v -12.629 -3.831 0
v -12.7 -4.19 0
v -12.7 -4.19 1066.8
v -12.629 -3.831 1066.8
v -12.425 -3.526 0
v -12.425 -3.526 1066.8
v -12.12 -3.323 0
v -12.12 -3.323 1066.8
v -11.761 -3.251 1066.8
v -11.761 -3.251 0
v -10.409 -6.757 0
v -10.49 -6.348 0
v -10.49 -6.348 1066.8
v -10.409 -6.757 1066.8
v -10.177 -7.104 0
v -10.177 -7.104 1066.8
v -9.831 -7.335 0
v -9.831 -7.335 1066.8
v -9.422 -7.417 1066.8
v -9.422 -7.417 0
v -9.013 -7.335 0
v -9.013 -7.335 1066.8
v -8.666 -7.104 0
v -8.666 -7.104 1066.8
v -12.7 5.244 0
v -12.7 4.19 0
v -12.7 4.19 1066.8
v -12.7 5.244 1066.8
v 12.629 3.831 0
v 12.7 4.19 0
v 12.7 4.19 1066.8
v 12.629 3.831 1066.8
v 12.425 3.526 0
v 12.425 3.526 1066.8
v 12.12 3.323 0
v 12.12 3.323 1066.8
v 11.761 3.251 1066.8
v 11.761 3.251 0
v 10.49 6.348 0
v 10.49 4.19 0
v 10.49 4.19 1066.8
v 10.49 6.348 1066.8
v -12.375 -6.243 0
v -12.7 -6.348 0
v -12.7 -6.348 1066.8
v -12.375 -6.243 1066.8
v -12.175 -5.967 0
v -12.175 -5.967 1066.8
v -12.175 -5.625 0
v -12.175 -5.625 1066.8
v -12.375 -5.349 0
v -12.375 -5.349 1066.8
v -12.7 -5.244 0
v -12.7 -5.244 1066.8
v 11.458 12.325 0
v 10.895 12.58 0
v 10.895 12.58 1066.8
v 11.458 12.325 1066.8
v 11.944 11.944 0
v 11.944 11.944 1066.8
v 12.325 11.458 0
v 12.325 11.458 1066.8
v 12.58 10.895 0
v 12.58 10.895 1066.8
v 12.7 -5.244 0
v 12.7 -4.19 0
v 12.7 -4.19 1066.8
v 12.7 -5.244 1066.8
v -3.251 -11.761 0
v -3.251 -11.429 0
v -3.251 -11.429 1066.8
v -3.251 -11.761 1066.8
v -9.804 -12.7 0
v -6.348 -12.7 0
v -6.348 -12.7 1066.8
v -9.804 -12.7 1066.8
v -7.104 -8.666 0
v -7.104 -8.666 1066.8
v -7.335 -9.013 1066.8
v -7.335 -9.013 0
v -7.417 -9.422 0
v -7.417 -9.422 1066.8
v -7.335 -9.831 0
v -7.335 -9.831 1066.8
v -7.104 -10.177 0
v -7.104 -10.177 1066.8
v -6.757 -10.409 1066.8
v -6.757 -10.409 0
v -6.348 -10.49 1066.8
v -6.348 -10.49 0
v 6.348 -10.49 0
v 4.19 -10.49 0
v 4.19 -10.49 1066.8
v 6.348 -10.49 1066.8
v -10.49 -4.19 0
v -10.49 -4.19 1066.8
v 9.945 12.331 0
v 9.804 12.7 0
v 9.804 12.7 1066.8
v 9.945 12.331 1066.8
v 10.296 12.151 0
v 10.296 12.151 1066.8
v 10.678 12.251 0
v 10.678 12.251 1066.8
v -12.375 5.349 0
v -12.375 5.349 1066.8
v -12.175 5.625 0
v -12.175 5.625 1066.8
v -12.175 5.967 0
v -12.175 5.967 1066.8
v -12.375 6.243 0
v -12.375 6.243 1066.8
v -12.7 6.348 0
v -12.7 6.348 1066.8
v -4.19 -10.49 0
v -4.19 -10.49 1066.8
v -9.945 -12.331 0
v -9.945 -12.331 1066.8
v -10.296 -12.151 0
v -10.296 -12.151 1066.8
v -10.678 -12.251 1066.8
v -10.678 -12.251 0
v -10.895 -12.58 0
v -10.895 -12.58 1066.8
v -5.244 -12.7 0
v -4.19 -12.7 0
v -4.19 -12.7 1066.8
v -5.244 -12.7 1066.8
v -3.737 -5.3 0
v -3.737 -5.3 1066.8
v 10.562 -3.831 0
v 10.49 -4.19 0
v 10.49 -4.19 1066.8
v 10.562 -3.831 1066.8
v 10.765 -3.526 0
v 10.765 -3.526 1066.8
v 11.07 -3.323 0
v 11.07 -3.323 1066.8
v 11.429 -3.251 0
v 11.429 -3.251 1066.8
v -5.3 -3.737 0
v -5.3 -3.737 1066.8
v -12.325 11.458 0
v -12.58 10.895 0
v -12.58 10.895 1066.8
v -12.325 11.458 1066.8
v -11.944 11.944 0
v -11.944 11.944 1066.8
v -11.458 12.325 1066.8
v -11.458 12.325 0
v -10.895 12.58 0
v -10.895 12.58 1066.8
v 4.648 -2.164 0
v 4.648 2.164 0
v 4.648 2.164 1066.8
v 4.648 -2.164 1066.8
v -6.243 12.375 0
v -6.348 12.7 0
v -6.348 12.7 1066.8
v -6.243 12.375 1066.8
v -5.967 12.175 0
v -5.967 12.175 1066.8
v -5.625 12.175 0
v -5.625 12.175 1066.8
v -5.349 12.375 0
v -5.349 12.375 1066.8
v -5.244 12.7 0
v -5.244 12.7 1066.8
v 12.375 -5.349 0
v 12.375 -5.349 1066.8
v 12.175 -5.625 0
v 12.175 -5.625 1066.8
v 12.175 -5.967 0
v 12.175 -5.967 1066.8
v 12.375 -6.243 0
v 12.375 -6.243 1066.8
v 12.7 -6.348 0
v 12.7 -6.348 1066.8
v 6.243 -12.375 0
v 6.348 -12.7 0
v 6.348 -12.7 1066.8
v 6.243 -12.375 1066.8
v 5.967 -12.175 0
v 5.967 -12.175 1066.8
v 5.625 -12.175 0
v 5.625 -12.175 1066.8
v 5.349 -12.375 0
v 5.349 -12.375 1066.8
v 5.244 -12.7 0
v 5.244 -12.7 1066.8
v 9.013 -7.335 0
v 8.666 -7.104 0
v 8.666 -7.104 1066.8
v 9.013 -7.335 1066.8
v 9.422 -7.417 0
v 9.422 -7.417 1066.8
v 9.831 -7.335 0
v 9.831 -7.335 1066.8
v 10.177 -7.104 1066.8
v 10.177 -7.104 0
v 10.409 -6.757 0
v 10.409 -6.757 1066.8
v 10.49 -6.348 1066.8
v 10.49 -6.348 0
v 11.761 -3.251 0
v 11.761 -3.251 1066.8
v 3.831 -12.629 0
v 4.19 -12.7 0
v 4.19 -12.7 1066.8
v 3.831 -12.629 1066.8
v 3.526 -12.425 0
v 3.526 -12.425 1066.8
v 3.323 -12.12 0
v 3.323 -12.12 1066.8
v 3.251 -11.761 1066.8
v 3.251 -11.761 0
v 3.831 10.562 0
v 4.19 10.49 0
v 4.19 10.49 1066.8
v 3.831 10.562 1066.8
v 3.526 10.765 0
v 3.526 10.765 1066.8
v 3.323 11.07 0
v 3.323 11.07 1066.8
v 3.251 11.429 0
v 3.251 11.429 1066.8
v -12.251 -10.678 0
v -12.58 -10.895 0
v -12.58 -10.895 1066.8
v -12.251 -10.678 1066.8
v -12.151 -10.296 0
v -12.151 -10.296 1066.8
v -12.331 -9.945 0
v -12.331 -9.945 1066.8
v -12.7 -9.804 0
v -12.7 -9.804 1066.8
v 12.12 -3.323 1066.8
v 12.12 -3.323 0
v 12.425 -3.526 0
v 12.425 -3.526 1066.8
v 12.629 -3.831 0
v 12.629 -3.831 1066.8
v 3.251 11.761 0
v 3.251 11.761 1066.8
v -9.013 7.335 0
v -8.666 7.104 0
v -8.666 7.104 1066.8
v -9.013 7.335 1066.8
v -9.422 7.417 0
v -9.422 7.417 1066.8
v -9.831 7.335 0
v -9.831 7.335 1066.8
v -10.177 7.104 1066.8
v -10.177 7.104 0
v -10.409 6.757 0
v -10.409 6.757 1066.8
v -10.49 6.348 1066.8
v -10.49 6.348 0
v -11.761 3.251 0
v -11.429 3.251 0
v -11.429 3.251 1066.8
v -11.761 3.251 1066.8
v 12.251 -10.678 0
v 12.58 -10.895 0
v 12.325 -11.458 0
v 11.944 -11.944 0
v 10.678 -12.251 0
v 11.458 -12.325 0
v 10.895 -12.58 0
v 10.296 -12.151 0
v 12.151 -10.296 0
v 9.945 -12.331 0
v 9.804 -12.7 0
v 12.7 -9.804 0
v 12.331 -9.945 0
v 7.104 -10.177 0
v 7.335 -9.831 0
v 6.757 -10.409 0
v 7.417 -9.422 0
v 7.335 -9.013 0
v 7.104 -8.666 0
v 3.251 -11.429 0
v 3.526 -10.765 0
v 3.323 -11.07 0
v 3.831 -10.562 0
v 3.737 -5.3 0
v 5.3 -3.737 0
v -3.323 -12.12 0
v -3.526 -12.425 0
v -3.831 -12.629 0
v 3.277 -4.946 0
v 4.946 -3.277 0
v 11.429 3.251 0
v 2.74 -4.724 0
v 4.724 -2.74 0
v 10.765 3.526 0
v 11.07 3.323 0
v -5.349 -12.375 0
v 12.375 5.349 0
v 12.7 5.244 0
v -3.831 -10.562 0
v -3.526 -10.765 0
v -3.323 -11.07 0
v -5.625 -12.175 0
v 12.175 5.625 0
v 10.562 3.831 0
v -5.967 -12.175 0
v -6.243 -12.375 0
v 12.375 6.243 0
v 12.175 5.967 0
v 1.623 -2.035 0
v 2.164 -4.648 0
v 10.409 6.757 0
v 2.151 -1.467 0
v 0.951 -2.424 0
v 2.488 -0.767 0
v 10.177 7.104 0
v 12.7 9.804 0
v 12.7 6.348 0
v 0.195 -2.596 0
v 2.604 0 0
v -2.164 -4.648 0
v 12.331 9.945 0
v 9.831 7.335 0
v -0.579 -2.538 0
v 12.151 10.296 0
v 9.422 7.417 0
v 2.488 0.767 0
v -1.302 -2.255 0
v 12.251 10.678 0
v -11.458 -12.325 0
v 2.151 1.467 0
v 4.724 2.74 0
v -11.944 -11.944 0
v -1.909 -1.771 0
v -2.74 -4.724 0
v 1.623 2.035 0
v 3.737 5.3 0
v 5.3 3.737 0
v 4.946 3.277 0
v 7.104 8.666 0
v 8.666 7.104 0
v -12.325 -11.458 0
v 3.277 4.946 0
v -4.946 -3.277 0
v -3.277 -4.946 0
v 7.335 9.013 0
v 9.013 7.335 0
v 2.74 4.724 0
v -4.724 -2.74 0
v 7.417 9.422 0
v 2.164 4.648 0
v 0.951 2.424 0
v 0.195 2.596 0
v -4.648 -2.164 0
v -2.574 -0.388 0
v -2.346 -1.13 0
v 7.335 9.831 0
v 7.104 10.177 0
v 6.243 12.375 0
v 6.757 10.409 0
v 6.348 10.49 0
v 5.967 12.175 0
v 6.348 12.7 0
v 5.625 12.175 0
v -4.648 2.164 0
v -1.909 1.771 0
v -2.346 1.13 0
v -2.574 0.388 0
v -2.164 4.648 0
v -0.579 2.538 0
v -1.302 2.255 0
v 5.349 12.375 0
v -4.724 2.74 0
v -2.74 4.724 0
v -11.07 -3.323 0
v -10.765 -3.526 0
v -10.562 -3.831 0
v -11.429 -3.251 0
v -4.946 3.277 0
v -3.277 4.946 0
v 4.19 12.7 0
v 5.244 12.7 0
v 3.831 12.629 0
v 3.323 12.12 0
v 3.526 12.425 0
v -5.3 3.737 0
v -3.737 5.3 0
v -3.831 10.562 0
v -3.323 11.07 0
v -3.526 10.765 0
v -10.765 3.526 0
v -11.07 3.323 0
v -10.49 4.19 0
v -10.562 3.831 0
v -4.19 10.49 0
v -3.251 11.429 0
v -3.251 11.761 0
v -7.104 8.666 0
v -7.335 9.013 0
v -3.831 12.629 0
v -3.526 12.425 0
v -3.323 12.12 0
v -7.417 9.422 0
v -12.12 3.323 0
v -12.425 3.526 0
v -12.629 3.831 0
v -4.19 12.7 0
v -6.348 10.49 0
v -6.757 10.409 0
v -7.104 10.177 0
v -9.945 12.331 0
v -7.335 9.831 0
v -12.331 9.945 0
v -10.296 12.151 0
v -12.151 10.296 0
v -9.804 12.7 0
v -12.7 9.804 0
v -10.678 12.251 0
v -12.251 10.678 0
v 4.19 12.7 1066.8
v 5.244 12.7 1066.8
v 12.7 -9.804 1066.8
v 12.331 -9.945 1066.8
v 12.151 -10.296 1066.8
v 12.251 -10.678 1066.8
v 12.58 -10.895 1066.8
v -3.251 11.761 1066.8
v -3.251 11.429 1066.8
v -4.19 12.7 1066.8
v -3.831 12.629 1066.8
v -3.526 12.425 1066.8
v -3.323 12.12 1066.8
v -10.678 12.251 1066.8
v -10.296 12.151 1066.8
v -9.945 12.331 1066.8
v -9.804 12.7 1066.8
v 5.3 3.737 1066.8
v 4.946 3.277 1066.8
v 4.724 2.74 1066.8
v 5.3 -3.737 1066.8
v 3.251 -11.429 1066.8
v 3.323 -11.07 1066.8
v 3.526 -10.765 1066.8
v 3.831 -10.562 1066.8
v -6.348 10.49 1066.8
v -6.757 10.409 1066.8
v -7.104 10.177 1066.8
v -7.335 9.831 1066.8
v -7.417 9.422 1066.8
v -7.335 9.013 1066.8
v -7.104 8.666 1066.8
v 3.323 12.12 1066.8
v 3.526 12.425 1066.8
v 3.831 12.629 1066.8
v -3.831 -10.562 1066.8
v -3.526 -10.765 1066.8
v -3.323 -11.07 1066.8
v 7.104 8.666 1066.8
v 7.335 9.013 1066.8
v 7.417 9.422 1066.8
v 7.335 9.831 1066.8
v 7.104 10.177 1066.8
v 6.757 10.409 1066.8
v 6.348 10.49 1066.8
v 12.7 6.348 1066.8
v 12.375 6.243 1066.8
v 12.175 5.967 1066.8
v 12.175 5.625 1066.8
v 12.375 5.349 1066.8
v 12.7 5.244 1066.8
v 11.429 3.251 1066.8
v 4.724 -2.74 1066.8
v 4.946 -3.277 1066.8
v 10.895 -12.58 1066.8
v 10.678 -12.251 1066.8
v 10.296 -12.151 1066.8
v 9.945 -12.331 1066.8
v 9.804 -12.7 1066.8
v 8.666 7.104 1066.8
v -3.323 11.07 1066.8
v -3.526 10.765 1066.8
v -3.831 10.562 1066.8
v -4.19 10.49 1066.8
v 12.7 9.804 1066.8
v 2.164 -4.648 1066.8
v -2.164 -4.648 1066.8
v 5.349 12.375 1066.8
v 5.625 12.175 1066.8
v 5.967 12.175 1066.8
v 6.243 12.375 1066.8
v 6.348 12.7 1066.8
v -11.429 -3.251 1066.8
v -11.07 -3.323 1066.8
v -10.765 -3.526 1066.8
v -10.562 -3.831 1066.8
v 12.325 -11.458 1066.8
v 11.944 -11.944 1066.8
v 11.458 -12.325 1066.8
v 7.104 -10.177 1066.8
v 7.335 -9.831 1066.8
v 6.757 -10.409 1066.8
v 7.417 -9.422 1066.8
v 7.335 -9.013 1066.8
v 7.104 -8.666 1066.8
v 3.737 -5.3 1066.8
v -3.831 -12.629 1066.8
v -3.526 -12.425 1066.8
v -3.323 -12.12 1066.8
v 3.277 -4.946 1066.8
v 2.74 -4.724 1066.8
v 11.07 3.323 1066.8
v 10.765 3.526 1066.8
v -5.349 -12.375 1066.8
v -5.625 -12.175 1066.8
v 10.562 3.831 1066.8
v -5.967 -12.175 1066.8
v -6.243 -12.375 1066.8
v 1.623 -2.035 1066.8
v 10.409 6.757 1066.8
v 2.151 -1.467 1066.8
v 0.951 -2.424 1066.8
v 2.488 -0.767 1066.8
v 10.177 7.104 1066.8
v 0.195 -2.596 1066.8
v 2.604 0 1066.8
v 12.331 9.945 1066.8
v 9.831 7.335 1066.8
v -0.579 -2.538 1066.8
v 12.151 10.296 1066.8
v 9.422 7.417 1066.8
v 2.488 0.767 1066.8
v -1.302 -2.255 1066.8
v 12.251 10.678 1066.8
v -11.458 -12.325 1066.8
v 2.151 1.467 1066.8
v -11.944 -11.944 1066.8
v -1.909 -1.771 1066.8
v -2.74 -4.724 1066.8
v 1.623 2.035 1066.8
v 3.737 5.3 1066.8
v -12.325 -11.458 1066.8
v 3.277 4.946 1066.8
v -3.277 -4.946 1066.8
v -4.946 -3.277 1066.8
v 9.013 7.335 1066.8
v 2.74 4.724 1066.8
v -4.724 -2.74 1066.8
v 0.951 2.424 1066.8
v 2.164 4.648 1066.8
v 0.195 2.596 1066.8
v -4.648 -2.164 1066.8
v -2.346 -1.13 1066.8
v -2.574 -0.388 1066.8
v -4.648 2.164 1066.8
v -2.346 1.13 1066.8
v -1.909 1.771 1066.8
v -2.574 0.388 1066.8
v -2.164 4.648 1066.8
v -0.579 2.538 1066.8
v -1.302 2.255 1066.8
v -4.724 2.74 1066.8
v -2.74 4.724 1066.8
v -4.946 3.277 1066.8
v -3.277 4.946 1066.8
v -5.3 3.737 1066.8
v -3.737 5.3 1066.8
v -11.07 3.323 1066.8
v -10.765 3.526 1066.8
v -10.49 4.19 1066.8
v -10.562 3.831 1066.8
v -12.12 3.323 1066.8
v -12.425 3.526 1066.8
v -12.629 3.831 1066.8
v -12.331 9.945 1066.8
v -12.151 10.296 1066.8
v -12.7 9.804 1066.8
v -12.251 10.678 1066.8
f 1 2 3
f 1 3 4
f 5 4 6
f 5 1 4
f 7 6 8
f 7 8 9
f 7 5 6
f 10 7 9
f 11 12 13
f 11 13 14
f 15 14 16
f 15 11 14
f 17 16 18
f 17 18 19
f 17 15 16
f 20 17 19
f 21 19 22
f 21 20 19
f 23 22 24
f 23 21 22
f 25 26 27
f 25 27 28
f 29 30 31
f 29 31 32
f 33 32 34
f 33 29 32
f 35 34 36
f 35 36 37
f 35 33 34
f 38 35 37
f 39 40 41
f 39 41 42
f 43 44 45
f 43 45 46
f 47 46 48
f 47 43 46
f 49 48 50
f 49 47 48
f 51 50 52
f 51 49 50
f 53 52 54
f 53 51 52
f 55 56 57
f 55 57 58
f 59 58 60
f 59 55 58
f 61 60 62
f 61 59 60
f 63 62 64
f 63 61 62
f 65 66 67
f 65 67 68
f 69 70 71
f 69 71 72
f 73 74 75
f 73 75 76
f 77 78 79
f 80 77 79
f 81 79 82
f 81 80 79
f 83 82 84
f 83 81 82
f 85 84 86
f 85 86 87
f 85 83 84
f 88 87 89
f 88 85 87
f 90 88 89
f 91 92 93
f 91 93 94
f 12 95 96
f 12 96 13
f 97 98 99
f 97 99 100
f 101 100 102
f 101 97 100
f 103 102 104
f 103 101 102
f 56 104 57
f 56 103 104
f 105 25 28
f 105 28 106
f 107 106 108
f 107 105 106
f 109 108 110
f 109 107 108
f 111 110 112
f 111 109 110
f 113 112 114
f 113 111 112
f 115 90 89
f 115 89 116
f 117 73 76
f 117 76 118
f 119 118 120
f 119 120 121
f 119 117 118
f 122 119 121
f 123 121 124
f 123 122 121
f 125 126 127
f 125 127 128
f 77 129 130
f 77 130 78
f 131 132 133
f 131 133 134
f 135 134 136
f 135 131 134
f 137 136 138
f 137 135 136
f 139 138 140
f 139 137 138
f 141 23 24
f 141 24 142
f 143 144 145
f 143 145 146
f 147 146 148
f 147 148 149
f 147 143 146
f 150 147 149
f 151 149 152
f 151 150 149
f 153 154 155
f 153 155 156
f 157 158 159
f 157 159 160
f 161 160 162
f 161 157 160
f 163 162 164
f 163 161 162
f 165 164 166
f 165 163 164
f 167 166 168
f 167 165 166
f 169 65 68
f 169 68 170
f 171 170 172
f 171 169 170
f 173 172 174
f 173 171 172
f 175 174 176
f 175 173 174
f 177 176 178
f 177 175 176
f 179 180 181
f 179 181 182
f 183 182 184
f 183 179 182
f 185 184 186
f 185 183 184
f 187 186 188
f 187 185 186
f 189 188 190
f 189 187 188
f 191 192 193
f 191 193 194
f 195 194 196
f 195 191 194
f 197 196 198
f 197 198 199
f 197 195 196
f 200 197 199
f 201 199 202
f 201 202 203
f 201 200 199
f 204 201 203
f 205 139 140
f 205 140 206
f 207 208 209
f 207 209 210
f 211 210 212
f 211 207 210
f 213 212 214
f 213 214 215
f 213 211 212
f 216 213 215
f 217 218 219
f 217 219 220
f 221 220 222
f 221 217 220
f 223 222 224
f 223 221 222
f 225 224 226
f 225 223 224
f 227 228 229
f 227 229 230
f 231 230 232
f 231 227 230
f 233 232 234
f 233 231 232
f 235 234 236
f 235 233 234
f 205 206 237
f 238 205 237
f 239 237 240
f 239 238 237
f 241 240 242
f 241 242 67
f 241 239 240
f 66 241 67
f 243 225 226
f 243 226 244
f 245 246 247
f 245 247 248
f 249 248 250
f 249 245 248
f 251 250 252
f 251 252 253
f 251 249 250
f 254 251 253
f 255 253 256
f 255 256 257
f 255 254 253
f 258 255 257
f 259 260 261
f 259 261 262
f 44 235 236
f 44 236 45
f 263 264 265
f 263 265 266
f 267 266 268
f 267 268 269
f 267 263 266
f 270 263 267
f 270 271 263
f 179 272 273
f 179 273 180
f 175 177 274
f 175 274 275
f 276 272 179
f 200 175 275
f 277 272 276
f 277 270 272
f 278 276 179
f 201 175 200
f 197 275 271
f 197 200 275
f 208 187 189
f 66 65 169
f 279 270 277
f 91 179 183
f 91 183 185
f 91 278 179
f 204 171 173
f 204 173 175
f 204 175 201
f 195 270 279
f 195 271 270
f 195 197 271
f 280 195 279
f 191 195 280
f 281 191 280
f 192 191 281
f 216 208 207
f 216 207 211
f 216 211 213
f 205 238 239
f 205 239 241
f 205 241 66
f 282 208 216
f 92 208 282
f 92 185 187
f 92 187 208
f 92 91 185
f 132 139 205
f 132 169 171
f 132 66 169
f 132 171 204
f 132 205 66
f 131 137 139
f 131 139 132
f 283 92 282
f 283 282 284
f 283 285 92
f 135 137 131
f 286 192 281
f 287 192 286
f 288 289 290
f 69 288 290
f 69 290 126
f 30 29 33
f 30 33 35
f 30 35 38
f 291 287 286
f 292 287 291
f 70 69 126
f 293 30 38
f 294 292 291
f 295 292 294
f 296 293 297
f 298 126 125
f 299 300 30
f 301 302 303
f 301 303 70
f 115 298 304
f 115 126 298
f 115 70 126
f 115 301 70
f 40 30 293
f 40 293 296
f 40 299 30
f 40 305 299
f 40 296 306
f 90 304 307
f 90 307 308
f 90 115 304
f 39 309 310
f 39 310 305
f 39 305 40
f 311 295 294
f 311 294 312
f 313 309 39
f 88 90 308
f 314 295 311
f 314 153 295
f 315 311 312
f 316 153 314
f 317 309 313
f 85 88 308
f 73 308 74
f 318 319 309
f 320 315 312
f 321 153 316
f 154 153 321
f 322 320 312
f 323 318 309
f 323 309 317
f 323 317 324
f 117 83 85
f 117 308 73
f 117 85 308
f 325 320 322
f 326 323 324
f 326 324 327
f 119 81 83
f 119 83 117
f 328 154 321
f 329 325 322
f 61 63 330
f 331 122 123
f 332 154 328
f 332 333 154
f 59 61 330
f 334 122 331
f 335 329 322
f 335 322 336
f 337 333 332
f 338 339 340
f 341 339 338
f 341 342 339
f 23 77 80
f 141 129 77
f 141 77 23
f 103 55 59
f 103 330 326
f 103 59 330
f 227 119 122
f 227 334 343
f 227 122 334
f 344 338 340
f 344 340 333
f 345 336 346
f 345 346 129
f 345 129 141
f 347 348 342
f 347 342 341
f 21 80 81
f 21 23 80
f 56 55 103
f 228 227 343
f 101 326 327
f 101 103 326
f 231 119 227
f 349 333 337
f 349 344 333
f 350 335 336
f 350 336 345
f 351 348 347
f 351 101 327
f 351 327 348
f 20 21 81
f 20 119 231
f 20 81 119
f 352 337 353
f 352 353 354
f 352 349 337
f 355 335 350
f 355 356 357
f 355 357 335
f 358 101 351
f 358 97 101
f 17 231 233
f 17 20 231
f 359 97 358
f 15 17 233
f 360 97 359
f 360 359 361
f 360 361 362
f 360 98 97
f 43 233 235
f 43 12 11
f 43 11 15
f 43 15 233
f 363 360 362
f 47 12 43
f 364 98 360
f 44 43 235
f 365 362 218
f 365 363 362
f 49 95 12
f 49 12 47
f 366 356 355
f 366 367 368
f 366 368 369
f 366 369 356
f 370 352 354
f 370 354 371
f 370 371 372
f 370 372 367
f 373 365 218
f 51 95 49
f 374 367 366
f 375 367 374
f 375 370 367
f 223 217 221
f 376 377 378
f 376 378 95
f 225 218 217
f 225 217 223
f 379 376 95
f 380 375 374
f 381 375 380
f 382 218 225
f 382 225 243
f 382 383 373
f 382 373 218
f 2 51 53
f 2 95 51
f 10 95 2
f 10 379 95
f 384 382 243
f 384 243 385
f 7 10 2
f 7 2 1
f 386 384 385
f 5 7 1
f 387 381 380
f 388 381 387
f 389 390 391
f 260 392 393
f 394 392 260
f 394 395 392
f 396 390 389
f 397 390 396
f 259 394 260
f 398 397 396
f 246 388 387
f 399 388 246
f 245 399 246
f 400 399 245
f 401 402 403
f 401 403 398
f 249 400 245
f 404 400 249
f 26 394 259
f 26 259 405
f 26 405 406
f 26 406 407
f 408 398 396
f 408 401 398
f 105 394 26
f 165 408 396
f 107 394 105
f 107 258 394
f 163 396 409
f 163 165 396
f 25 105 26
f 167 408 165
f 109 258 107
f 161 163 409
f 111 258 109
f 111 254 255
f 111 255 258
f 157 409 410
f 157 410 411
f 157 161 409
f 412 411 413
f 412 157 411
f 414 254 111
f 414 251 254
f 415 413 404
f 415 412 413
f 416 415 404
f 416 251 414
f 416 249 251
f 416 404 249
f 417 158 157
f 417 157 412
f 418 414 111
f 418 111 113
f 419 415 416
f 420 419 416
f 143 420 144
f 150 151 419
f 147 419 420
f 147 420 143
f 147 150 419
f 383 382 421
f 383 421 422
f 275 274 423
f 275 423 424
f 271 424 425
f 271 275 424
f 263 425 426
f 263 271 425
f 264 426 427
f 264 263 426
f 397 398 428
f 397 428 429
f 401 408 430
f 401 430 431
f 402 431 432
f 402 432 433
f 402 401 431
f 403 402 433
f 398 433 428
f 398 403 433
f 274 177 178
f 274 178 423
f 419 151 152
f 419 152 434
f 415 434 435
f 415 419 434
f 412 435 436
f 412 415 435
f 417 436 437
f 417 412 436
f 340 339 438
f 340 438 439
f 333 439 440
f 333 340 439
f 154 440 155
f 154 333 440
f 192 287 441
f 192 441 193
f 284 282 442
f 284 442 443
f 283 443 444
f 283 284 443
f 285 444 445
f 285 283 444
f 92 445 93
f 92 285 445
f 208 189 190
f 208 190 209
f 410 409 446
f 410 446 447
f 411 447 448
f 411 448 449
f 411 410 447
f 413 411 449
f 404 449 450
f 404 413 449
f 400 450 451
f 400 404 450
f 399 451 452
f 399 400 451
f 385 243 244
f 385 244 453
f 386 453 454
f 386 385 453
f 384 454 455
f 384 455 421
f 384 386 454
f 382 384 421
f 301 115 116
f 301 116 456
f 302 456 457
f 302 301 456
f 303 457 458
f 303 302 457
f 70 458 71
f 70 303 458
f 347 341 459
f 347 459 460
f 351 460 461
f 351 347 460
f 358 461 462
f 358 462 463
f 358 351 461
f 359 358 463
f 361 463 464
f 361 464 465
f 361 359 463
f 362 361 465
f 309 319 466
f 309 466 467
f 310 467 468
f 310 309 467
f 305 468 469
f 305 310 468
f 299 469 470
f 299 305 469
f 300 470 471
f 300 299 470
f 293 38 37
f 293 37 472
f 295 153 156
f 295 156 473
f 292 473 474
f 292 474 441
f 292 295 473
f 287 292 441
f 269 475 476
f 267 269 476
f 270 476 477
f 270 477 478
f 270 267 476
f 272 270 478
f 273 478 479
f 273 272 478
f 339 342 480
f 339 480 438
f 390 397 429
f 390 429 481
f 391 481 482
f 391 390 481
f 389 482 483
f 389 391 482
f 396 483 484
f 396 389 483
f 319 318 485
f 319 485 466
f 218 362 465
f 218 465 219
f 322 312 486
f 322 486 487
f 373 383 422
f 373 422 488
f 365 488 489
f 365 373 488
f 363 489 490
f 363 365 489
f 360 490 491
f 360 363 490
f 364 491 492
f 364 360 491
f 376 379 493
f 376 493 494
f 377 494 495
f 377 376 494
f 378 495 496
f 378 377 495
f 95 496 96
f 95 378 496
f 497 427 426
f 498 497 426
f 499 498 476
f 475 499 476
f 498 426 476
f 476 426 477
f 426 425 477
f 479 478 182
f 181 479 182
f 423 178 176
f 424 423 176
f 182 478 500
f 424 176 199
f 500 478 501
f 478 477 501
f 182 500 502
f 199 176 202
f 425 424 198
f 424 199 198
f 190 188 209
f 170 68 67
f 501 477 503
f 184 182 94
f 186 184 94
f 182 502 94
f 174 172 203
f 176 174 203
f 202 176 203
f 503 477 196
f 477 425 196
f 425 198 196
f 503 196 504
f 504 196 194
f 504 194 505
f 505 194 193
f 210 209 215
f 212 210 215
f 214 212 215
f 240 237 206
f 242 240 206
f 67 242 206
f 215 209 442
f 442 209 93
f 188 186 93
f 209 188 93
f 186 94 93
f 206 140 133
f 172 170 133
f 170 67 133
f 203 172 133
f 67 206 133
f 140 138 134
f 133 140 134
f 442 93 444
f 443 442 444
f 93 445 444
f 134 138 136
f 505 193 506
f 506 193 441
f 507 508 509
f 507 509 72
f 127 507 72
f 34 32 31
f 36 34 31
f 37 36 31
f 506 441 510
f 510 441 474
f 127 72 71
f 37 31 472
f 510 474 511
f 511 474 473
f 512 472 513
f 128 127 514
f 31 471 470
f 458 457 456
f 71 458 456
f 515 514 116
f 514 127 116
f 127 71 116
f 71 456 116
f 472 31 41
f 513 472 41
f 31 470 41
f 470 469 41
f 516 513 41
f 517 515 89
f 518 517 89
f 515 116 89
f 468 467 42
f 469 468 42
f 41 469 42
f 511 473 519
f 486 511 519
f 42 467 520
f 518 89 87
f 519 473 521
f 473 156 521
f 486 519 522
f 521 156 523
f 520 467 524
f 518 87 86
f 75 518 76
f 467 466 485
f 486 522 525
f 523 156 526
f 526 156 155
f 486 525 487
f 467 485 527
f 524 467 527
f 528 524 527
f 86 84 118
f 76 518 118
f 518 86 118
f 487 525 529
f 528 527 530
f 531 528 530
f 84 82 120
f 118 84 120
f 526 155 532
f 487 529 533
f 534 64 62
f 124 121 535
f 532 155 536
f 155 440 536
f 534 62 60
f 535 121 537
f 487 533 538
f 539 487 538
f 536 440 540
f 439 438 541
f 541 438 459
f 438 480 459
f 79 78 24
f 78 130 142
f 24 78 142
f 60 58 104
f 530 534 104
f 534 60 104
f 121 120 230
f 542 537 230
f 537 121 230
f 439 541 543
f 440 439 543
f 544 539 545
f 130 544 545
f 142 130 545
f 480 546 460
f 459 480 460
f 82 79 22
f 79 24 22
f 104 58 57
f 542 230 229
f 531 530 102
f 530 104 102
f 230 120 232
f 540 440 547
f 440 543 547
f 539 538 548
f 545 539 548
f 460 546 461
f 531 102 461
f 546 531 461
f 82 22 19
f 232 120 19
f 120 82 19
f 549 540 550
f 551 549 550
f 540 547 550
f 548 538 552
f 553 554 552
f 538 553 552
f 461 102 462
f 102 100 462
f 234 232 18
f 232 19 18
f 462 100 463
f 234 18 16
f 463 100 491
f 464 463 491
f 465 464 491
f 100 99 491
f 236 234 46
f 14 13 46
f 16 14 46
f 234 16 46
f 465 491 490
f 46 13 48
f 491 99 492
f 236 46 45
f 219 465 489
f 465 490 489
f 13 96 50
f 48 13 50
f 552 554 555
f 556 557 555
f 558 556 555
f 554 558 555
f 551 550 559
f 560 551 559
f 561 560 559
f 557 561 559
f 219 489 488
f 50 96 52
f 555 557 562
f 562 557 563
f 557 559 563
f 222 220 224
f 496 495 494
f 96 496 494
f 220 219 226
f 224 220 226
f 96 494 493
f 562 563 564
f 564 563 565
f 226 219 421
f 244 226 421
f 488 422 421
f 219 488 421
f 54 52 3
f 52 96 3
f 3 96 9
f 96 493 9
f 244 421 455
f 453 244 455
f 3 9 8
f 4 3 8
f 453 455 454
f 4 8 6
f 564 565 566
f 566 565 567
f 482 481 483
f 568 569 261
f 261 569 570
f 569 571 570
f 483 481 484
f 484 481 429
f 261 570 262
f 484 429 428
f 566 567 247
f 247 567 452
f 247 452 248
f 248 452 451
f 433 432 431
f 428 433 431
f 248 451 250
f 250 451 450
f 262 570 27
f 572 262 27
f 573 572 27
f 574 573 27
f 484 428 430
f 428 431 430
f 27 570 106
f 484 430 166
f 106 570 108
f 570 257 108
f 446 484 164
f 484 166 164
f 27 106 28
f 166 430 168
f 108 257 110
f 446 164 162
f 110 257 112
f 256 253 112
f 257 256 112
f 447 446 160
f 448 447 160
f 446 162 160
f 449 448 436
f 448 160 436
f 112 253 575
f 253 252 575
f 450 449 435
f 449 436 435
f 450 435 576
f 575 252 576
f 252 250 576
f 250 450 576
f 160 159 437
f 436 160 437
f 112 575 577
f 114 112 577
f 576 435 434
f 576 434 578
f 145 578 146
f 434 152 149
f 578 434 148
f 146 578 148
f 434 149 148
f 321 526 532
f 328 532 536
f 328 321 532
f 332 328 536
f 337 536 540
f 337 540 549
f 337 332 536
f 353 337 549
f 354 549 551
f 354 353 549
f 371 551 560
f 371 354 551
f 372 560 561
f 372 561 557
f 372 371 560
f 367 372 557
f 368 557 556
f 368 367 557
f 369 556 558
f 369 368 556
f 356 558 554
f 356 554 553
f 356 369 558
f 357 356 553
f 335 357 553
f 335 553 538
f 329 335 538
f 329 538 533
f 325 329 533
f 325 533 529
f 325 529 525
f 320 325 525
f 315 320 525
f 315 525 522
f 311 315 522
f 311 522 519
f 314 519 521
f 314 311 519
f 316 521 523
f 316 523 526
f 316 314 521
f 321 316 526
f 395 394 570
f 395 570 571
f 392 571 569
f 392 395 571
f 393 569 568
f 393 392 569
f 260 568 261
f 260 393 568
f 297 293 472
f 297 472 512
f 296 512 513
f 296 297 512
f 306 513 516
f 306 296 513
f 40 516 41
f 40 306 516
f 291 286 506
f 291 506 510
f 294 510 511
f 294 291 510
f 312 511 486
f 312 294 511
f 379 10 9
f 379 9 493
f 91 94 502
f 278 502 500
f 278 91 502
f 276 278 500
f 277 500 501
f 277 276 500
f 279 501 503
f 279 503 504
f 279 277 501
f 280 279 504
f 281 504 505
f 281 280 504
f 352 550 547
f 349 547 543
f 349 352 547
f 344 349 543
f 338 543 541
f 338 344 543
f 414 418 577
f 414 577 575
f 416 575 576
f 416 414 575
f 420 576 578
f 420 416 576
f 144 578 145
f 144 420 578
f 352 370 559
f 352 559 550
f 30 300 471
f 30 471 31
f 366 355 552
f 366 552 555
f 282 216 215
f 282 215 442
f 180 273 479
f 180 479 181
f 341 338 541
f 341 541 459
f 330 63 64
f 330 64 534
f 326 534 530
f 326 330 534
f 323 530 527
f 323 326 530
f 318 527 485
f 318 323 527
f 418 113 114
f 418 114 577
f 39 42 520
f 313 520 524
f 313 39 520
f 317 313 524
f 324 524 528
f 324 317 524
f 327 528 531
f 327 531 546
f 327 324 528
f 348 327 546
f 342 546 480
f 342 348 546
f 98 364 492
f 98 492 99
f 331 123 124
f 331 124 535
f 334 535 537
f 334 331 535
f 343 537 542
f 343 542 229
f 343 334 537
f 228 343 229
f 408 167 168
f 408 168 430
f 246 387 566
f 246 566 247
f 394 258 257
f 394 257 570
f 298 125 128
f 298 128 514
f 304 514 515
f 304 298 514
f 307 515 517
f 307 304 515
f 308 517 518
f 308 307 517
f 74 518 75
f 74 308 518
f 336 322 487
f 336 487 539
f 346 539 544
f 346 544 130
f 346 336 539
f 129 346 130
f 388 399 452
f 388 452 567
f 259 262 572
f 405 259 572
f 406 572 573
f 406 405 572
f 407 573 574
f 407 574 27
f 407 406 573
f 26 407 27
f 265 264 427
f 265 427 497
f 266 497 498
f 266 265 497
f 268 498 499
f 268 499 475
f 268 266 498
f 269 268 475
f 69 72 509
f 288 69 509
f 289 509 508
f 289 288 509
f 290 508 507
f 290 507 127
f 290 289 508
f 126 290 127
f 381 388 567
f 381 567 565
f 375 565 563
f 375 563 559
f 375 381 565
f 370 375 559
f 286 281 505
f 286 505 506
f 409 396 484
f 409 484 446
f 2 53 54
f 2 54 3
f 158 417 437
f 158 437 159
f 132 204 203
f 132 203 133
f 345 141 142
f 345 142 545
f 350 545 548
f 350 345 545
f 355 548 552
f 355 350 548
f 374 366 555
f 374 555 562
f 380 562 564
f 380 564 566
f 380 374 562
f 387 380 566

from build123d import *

# Parameters (mm, degrees)
SKETCH1_R           = 2.6035
BOSS_EXTRUDE1_DEPTH = 1066.8


with BuildPart() as part:
    # Sketch1 → Boss-Extrude1 (new body)
    with BuildSketch(Plane.XY):
        with BuildLine():
            Line((-3.737334562, -5.299899128), (-7.103895736, -8.666460301))
            ThreePointArc((-7.103895736, -8.666460301), (-7.335478831, -9.830707141), (-6.348478019, -10.4902))
            Line((-6.348478019, -10.4902), (-4.190365, -10.4902))
            ThreePointArc((-4.190365, -10.4902), (-3.52627506, -10.76527506), (-3.2512, -11.429365))
            Line((-3.2512, -11.429365), (-3.2512, -11.760835))
            ThreePointArc((-3.2512, -11.760835), (-3.52627506, -12.42492494), (-4.190365, -12.7))
            Line((-4.190365, -12.7), (-5.243578019, -12.7))
            ThreePointArc((-5.243578019, -12.7), (-5.796028019, -12.14755), (-6.348478019, -12.7))
            Line((-6.348478019, -12.7), (-9.803703153, -12.7))
            ThreePointArc((-9.803703153, -12.7), (-10.295790179, -12.150857656), (-10.895412136, -12.579996867))
            ThreePointArc((-10.895412136, -12.579996867), (-11.943543586, -11.943543585), (-12.579996867, -10.895412135))
            ThreePointArc((-12.579996867, -10.895412135), (-12.150857661, -10.295790179), (-12.7, -9.803703154))
            Line((-12.7, -9.803703154), (-12.7, -6.348478019))
            ThreePointArc((-12.7, -6.348478019), (-12.14755, -5.796028019), (-12.7, -5.243578019))
            Line((-12.7, -5.243578019), (-12.7, -4.190365))
            ThreePointArc((-12.7, -4.190365), (-12.42492494, -3.52627506), (-11.760835, -3.2512))
            Line((-11.760835, -3.2512), (-11.429365, -3.2512))
            ThreePointArc((-11.429365, -3.2512), (-10.76527506, -3.52627506), (-10.4902, -4.190365))
            Line((-10.4902, -4.190365), (-10.4902, -6.348478019))
            ThreePointArc((-10.4902, -6.348478019), (-9.830707141, -7.335478831), (-8.666460302, -7.103895737))
            Line((-8.666460302, -7.103895737), (-5.299899128, -3.737334563))
            ThreePointArc((-5.299899128, -3.737334563), (-4.817571085, -3.015479635), (-4.6482, -2.163993691))
            Line((-4.6482, -2.163993691), (-4.6482, 2.16399369))
            ThreePointArc((-4.6482, 2.16399369), (-4.817571084, 3.015479634), (-5.299899127, 3.737334562))
            Line((-5.299899127, 3.737334562), (-8.666460301, 7.103895736))
            ThreePointArc((-8.666460301, 7.103895736), (-9.83070714, 7.335478831), (-10.490199999, 6.348478019))
            Line((-10.490199999, 6.348478019), (-10.490199999, 4.190365))
            ThreePointArc((-10.490199999, 4.190365), (-10.765275058, 3.52627506), (-11.429364999, 3.2512))
            Line((-11.429364999, 3.2512), (-11.760834999, 3.2512))
            ThreePointArc((-11.760834999, 3.2512), (-12.424924939, 3.52627506), (-12.699999999, 4.190365))
            Line((-12.699999999, 4.190365), (-12.699999999, 5.243578019))
            ThreePointArc((-12.699999999, 5.243578019), (-12.147549999, 5.796028019), (-12.699999999, 6.348478019))
            Line((-12.699999999, 6.348478019), (-12.699999999, 9.803703154))
            ThreePointArc((-12.699999999, 9.803703154), (-12.15085766, 10.295790179), (-12.579996866, 10.895412135))
            ThreePointArc((-12.579996866, 10.895412135), (-11.943543584, 11.943543586), (-10.895412134, 12.579996867))
            ThreePointArc((-10.895412134, 12.579996867), (-10.295790177, 12.150857661), (-9.803703152, 12.7))
            Line((-9.803703152, 12.7), (-6.348478018, 12.7))
            ThreePointArc((-6.348478018, 12.7), (-5.796028018, 12.14755), (-5.243578018, 12.7))
            Line((-5.243578018, 12.7), (-4.190364999, 12.7))
            ThreePointArc((-4.190364999, 12.7), (-3.526275058, 12.42492494), (-3.251199999, 11.760835))
            Line((-3.251199999, 11.760835), (-3.251199999, 11.429365))
            ThreePointArc((-3.251199999, 11.429365), (-3.526275058, 10.76527506), (-4.190364999, 10.4902))
            Line((-4.190364999, 10.4902), (-6.348478018, 10.4902))
            ThreePointArc((-6.348478018, 10.4902), (-7.33547883, 9.830707142), (-7.103895735, 8.666460303))
            Line((-7.103895735, 8.666460303), (-3.737334561, 5.299899129))
            ThreePointArc((-3.737334561, 5.299899129), (-3.015479634, 4.817571086), (-2.16399369, 4.6482))
            Line((-2.16399369, 4.6482), (2.163993692, 4.6482))
            ThreePointArc((2.163993692, 4.6482), (3.015479636, 4.817571085), (3.737334564, 5.299899128))
            Line((3.737334564, 5.299899128), (7.103895738, 8.666460302))
            ThreePointArc((7.103895738, 8.666460302), (7.335478833, 9.830707141), (6.348478021, 10.4902))
            Line((6.348478021, 10.4902), (4.190365002, 10.4902))
            ThreePointArc((4.190365002, 10.4902), (3.526275062, 10.76527506), (3.251200002, 11.429365))
            Line((3.251200002, 11.429365), (3.251200002, 11.760835))
            ThreePointArc((3.251200002, 11.760835), (3.526275062, 12.42492494), (4.190365002, 12.7))
            Line((4.190365002, 12.7), (5.243578021, 12.7))
            ThreePointArc((5.243578021, 12.7), (5.796028021, 12.14755), (6.348478021, 12.7))
            Line((6.348478021, 12.7), (9.803703155, 12.7))
            ThreePointArc((9.803703155, 12.7), (10.295790181, 12.150857656), (10.895412138, 12.579996867))
            ThreePointArc((10.895412138, 12.579996867), (11.943543588, 11.943543585), (12.579996869, 10.895412136))
            ThreePointArc((12.579996869, 10.895412136), (12.150857663, 10.295790179), (12.700000001, 9.803703154))
            Line((12.700000001, 9.803703154), (12.700000001, 6.34847802))
            ThreePointArc((12.700000001, 6.34847802), (12.147550001, 5.79602802), (12.700000001, 5.24357802))
            Line((12.700000001, 5.24357802), (12.700000001, 4.190365001))
            ThreePointArc((12.700000001, 4.190365001), (12.424924941, 3.526275061), (11.760835001, 3.251200001))
            Line((11.760835001, 3.251200001), (11.429365001, 3.251200001))
            ThreePointArc((11.429365001, 3.251200001), (10.765275061, 3.526275061), (10.490200001, 4.190365001))
            Line((10.490200001, 4.190365001), (10.490200001, 6.34847802))
            ThreePointArc((10.490200001, 6.34847802), (9.830707143, 7.335478832), (8.666460303, 7.103895738))
            Line((8.666460303, 7.103895738), (5.299899129, 3.737334564))
            ThreePointArc((5.299899129, 3.737334564), (4.817571086, 3.015479636), (4.648200001, 2.163993692))
            Line((4.648200001, 2.163993692), (4.648200001, -2.163993689))
            ThreePointArc((4.648200001, -2.163993689), (4.817571086, -3.015479633), (5.299899128, -3.737334561))
            Line((5.299899128, -3.737334561), (8.666460302, -7.103895735))
            ThreePointArc((8.666460302, -7.103895735), (9.830707141, -7.33547883), (10.4902, -6.348478018))
            Line((10.4902, -6.348478018), (10.4902, -4.190364999))
            ThreePointArc((10.4902, -4.190364999), (10.76527506, -3.526275059), (11.429365, -3.251199999))
            Line((11.429365, -3.251199999), (11.760835, -3.251199999))
            ThreePointArc((11.760835, -3.251199999), (12.42492494, -3.526275059), (12.7, -4.190364999))
            Line((12.7, -4.190364999), (12.7, -5.243578018))
            ThreePointArc((12.7, -5.243578018), (12.14755, -5.796028018), (12.7, -6.348478018))
            Line((12.7, -6.348478018), (12.7, -9.803703153))
            ThreePointArc((12.7, -9.803703153), (12.150857661, -10.295790178), (12.579996867, -10.895412134))
            ThreePointArc((12.579996867, -10.895412134), (11.943543586, -11.943543584), (10.895412136, -12.579996866))
            ThreePointArc((10.895412136, -12.579996866), (10.295790179, -12.150857655), (9.803703154, -12.699999999))
            Line((9.803703154, -12.699999999), (6.348478019, -12.699999999))
            ThreePointArc((6.348478019, -12.699999999), (5.796028019, -12.147549999), (5.243578019, -12.699999999))
            Line((5.243578019, -12.699999999), (4.190365, -12.699999999))
            ThreePointArc((4.190365, -12.699999999), (3.52627506, -12.424924939), (3.2512, -11.760834999))
            Line((3.2512, -11.760834999), (3.2512, -11.429364999))
            ThreePointArc((3.2512, -11.429364999), (3.52627506, -10.765275059), (4.190365, -10.490199999))
            Line((4.190365, -10.490199999), (6.348478019, -10.490199999))
            ThreePointArc((6.348478019, -10.490199999), (7.335478831, -9.830707141), (7.103895737, -8.666460301))
            Line((7.103895737, -8.666460301), (3.737334563, -5.299899128))
            ThreePointArc((3.737334563, -5.299899128), (3.015479635, -4.817571085), (2.163993691, -4.648199999))
            Line((2.163993691, -4.648199999), (-2.163993691, -4.648199999))
            ThreePointArc((-2.163993691, -4.648199999), (-3.015479635, -4.817571085), (-3.737334562, -5.299899128))
        make_face()
        Circle(SKETCH1_R, mode=Mode.SUBTRACT)
    extrude(amount=BOSS_EXTRUDE1_DEPTH)


solid = part.part
